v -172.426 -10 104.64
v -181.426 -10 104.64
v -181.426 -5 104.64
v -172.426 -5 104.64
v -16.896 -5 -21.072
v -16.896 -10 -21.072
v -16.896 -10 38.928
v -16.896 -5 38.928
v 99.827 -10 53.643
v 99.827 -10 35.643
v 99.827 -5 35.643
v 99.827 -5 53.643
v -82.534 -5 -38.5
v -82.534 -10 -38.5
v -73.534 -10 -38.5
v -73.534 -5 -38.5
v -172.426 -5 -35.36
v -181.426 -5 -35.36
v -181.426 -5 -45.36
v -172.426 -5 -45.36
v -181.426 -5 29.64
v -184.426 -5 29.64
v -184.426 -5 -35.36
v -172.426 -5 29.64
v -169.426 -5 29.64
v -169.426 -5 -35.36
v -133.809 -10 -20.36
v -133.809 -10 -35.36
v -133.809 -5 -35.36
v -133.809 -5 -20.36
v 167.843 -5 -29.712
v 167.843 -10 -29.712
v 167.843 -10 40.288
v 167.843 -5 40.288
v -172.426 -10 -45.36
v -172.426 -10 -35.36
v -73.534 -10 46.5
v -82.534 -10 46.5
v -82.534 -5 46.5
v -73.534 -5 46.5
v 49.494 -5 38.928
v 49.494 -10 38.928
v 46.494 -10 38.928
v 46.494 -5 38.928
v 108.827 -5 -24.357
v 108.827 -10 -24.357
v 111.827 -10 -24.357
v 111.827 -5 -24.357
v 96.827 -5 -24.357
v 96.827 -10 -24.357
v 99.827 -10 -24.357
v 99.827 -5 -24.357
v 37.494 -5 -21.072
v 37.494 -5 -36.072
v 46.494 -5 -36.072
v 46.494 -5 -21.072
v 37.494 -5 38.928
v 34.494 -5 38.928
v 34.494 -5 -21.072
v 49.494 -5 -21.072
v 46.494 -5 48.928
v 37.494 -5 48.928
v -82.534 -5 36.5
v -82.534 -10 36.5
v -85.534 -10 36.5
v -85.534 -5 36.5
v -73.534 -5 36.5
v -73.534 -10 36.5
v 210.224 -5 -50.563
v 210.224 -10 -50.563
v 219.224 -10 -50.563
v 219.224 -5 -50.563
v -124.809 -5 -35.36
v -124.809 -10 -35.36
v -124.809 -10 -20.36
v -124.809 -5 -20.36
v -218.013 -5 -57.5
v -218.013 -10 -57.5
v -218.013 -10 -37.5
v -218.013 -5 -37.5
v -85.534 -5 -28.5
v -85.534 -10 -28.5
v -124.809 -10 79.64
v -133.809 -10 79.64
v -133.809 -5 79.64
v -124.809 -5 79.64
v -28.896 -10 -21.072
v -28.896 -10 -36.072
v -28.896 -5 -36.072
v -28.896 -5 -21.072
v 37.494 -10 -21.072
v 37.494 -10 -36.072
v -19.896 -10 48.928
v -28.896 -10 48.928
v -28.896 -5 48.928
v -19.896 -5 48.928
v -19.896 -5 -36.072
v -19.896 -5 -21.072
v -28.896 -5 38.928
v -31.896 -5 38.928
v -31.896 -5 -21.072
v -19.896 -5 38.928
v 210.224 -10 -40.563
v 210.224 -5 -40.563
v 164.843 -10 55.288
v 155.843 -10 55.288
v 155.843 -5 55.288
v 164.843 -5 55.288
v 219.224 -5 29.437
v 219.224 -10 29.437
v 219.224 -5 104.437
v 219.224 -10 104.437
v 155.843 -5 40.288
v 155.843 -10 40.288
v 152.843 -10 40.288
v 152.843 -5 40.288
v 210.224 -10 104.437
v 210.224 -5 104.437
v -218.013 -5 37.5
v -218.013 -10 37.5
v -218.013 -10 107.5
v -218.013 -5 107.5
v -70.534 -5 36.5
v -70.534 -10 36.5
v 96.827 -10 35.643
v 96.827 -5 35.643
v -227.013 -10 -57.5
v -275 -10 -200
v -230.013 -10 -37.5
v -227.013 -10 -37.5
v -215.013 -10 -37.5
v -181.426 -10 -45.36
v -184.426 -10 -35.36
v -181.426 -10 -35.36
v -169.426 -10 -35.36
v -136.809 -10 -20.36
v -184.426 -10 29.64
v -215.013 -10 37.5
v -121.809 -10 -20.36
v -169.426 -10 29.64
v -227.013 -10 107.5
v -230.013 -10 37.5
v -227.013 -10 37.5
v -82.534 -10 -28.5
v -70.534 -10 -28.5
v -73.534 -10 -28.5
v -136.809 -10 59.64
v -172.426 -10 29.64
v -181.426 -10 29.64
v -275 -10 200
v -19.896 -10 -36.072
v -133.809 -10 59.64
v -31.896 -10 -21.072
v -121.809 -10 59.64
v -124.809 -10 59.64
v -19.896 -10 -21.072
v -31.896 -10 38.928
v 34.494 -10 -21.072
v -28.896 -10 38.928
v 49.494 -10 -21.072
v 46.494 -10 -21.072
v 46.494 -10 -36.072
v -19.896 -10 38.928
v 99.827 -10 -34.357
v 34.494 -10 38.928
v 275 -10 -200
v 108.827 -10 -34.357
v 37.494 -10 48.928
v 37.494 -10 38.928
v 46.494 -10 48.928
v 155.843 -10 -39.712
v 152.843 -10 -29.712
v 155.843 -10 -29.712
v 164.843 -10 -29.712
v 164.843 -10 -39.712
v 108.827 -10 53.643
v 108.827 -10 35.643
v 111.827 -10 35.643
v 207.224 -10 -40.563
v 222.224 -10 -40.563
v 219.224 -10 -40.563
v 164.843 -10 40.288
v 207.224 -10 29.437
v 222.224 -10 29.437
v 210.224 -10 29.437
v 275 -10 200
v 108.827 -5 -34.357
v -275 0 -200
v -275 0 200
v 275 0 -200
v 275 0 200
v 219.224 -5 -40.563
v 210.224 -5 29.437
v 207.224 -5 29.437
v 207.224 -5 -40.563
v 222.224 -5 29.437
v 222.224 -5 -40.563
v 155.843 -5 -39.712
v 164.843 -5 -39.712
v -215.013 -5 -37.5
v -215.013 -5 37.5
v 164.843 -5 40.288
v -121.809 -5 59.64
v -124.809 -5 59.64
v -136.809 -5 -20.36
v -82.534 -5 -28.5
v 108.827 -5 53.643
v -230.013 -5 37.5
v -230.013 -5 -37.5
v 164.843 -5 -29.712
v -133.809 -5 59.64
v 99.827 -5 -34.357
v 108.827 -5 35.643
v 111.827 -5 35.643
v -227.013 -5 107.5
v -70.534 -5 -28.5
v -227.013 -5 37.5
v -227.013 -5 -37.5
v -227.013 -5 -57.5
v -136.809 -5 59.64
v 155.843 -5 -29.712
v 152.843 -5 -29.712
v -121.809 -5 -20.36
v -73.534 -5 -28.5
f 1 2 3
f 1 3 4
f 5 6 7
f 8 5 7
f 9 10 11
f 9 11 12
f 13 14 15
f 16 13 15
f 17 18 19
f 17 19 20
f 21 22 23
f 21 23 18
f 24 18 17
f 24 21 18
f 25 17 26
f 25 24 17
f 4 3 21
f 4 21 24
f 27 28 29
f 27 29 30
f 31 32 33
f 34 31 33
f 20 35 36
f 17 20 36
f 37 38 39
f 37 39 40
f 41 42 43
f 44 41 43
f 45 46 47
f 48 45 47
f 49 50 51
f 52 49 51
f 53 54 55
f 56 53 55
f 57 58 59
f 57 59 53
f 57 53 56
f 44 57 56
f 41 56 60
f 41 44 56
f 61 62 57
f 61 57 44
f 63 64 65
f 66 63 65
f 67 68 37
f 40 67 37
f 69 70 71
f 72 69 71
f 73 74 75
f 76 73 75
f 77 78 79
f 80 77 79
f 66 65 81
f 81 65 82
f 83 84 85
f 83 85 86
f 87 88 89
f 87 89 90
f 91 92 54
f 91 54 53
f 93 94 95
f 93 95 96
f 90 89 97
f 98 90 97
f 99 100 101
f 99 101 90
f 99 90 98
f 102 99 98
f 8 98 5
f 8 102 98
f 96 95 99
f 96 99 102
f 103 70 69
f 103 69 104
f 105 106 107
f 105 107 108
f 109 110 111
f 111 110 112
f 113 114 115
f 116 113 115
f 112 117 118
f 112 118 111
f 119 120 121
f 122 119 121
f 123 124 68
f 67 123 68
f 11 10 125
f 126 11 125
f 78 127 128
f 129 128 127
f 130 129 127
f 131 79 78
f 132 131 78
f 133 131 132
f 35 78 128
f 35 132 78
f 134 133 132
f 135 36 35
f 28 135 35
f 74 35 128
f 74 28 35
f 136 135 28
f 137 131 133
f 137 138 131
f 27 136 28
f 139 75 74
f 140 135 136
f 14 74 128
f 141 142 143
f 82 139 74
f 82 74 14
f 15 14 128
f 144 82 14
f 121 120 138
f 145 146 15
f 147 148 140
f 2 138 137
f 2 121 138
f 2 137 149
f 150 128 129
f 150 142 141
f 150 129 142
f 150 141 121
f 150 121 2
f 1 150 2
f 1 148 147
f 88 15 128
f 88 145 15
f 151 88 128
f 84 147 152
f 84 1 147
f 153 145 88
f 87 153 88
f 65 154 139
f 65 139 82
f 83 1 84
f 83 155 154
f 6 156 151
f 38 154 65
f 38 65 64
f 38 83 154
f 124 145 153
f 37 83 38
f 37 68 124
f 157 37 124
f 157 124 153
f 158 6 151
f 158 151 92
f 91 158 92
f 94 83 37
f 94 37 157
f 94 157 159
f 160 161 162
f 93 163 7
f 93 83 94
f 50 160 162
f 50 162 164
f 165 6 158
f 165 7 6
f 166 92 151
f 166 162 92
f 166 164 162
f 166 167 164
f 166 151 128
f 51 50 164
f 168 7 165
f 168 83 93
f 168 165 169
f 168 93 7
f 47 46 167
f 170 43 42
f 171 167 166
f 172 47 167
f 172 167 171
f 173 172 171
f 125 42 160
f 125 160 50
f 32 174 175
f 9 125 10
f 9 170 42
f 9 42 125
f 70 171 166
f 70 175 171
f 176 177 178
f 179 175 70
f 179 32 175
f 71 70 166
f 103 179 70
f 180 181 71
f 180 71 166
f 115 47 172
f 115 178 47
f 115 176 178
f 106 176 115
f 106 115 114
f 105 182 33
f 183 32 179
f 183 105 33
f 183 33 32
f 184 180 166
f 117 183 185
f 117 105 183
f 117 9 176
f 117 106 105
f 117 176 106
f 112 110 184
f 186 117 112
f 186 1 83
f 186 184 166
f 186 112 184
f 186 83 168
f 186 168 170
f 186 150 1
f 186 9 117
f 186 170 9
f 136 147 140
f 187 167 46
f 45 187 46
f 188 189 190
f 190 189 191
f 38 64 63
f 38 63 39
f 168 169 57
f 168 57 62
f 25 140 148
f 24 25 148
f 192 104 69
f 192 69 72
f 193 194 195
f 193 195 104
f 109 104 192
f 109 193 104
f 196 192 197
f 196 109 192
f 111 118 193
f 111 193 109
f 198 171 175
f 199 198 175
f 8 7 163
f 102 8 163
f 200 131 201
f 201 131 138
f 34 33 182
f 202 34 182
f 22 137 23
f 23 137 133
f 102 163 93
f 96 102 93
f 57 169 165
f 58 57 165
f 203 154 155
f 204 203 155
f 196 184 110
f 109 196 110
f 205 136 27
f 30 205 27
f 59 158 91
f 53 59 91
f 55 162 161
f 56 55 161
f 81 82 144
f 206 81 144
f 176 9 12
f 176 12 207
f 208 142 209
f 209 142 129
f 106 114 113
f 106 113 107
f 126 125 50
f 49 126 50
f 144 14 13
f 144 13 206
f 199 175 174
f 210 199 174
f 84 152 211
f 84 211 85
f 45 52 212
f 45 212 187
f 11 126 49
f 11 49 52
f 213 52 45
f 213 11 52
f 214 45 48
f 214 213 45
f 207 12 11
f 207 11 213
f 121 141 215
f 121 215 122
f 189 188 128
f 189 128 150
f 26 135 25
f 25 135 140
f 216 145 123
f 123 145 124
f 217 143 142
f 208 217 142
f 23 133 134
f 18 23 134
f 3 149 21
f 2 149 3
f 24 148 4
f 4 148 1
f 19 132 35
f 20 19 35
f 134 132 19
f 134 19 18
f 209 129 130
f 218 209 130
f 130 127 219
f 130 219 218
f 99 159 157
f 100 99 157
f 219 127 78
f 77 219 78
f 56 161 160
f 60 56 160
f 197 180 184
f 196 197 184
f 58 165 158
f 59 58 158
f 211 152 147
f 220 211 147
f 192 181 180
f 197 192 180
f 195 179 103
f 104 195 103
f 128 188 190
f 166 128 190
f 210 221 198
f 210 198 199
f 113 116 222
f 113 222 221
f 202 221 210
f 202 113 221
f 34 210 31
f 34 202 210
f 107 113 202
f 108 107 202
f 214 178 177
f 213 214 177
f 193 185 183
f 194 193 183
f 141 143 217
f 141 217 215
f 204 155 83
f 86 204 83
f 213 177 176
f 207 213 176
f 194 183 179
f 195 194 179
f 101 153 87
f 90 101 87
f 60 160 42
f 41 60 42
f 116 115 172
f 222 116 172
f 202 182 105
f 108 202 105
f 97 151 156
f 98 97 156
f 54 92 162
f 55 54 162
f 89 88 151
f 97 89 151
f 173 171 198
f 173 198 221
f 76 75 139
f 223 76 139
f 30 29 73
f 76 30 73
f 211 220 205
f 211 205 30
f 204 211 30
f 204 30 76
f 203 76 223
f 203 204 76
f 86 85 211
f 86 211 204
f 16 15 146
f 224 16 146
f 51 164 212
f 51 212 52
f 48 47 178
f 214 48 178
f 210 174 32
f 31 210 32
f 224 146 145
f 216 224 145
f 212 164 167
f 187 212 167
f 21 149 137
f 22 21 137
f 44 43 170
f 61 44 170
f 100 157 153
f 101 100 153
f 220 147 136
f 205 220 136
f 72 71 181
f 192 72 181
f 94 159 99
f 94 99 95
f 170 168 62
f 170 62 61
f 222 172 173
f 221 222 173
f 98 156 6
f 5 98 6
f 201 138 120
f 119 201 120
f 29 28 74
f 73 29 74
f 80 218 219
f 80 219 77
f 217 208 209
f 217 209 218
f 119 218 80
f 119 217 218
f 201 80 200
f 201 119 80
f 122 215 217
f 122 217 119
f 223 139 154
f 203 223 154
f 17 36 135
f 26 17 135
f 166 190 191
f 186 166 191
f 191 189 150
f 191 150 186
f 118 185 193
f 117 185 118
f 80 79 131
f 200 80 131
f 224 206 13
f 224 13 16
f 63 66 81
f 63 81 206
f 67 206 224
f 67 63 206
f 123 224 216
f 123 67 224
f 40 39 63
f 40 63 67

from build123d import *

# Parameters (mm, degrees)
F0_W     = 550
F0_H     = 400
F1_DEPTH = 10
F2_W     = 9
F2_H     = 20
F2_H_2   = 70
F2_H_3   = 10
F2_H_4   = 75
F2_H_5   = 15
F2_H_6   = 18
F3_DEPTH = 5


with BuildPart() as f1:
    # F0 (on Front) → F1 (new body)
    with BuildSketch(Plane.XZ):
        Rectangle(F0_W, F0_H)
    extrude(amount=F1_DEPTH)

    # F2 (on face) → F3 (cut)
    with BuildSketch(Plane.XZ.offset(10)):
        Polygon((-218.013464, -37.5), (-215.013464, -37.5), (-215.013464, 37.5), (-218.013464, 37.5), (-227.013464, 37.5), (-230.013464, 37.5), (-230.013464, -37.5), (-227.013464, -37.5), align=None)
        with Locations((-222.513464, -47.5)):
            Rectangle(F2_W, F2_H)
        with Locations((-222.513464, 72.5)):
            Rectangle(F2_W, F2_H_2)
        Polygon((219.224181, -40.562903), (222.224181, -40.562903), (222.224181, 29.437097), (219.224181, 29.437097), (210.224181, 29.437097), (207.224181, 29.437097), (207.224181, -40.562903), (210.224181, -40.562903), align=None)
        with Locations((214.724181, -45.562903)):
            Rectangle(F2_W, F2_H_3)
        with Locations((214.724181, 66.937097)):
            Rectangle(F2_W, F2_H_4)
        Polygon((-172.425557, -35.359889), (-169.425557, -35.359889), (-169.425557, 29.640111), (-172.425557, 29.640111), (-181.425557, 29.640111), (-184.425557, 29.640111), (-184.425557, -35.359889), (-181.425557, -35.359889), align=None)
        with Locations((-176.925557, -40.359889)):
            Rectangle(F2_W, F2_H_3)
        with Locations((-176.925557, 67.140111)):
            Rectangle(F2_W, F2_H_4)
        Polygon((-124.808628, -20.359889), (-121.808628, -20.359889), (-121.808628, 59.640111), (-124.808628, 59.640111), (-133.808628, 59.640111), (-136.808628, 59.640111), (-136.808628, -20.359889), (-133.808628, -20.359889), align=None)
        with Locations((-129.308628, -27.859889)):
            Rectangle(F2_W, F2_H_5)
        with Locations((-129.308628, 69.640111)):
            Rectangle(F2_W, F2_H)
        Polygon((-73.533672, -28.500006), (-70.533672, -28.500006), (-70.533672, 36.499994), (-73.533672, 36.499994), (-82.533672, 36.499994), (-85.533672, 36.499994), (-85.533672, -28.500006), (-82.533672, -28.500006), align=None)
        with Locations((-78.033672, -33.500006)):
            Rectangle(F2_W, F2_H_3)
        with Locations((-78.033672, 41.499994)):
            Rectangle(F2_W, F2_H_3)
        Polygon((-19.896116, -21.071613), (-16.896116, -21.071613), (-16.896116, 38.928387), (-19.896116, 38.928387), (-28.896116, 38.928387), (-31.896116, 38.928387), (-31.896116, -21.071613), (-28.896116, -21.071613), align=None)
        with Locations((-24.396116, -28.571613)):
            Rectangle(F2_W, F2_H_5)
        with Locations((-24.396116, 43.928387)):
            Rectangle(F2_W, F2_H_3)
        Polygon((46.493838, -21.071613), (49.493838, -21.071613), (49.493838, 38.928387), (46.493838, 38.928387), (37.493838, 38.928387), (34.493838, 38.928387), (34.493838, -21.071613), (37.493838, -21.071613), align=None)
        with Locations((41.993838, -28.571613)):
            Rectangle(F2_W, F2_H_5)
        with Locations((41.993838, 43.928387)):
            Rectangle(F2_W, F2_H_3)
        Polygon((108.827169, -24.357102), (111.827169, -24.357102), (111.827169, 35.642898), (108.827169, 35.642898), (99.827169, 35.642898), (96.827169, 35.642898), (96.827169, -24.357102), (99.827169, -24.357102), align=None)
        with Locations((104.327169, -29.357102)):
            Rectangle(F2_W, F2_H_3)
        with Locations((104.327169, 44.642898)):
            Rectangle(F2_W, F2_H_6)
        Polygon((164.842565, -29.71177), (167.842565, -29.71177), (167.842565, 40.28823), (164.842565, 40.28823), (155.842565, 40.28823), (152.842565, 40.28823), (152.842565, -29.71177), (155.842565, -29.71177), align=None)
        with Locations((160.342565, -34.71177)):
            Rectangle(F2_W, F2_H_3)
        with Locations((160.342565, 47.78823)):
            Rectangle(F2_W, F2_H_5)
    extrude(amount=-F3_DEPTH, mode=Mode.SUBTRACT)


solid = f1.part
